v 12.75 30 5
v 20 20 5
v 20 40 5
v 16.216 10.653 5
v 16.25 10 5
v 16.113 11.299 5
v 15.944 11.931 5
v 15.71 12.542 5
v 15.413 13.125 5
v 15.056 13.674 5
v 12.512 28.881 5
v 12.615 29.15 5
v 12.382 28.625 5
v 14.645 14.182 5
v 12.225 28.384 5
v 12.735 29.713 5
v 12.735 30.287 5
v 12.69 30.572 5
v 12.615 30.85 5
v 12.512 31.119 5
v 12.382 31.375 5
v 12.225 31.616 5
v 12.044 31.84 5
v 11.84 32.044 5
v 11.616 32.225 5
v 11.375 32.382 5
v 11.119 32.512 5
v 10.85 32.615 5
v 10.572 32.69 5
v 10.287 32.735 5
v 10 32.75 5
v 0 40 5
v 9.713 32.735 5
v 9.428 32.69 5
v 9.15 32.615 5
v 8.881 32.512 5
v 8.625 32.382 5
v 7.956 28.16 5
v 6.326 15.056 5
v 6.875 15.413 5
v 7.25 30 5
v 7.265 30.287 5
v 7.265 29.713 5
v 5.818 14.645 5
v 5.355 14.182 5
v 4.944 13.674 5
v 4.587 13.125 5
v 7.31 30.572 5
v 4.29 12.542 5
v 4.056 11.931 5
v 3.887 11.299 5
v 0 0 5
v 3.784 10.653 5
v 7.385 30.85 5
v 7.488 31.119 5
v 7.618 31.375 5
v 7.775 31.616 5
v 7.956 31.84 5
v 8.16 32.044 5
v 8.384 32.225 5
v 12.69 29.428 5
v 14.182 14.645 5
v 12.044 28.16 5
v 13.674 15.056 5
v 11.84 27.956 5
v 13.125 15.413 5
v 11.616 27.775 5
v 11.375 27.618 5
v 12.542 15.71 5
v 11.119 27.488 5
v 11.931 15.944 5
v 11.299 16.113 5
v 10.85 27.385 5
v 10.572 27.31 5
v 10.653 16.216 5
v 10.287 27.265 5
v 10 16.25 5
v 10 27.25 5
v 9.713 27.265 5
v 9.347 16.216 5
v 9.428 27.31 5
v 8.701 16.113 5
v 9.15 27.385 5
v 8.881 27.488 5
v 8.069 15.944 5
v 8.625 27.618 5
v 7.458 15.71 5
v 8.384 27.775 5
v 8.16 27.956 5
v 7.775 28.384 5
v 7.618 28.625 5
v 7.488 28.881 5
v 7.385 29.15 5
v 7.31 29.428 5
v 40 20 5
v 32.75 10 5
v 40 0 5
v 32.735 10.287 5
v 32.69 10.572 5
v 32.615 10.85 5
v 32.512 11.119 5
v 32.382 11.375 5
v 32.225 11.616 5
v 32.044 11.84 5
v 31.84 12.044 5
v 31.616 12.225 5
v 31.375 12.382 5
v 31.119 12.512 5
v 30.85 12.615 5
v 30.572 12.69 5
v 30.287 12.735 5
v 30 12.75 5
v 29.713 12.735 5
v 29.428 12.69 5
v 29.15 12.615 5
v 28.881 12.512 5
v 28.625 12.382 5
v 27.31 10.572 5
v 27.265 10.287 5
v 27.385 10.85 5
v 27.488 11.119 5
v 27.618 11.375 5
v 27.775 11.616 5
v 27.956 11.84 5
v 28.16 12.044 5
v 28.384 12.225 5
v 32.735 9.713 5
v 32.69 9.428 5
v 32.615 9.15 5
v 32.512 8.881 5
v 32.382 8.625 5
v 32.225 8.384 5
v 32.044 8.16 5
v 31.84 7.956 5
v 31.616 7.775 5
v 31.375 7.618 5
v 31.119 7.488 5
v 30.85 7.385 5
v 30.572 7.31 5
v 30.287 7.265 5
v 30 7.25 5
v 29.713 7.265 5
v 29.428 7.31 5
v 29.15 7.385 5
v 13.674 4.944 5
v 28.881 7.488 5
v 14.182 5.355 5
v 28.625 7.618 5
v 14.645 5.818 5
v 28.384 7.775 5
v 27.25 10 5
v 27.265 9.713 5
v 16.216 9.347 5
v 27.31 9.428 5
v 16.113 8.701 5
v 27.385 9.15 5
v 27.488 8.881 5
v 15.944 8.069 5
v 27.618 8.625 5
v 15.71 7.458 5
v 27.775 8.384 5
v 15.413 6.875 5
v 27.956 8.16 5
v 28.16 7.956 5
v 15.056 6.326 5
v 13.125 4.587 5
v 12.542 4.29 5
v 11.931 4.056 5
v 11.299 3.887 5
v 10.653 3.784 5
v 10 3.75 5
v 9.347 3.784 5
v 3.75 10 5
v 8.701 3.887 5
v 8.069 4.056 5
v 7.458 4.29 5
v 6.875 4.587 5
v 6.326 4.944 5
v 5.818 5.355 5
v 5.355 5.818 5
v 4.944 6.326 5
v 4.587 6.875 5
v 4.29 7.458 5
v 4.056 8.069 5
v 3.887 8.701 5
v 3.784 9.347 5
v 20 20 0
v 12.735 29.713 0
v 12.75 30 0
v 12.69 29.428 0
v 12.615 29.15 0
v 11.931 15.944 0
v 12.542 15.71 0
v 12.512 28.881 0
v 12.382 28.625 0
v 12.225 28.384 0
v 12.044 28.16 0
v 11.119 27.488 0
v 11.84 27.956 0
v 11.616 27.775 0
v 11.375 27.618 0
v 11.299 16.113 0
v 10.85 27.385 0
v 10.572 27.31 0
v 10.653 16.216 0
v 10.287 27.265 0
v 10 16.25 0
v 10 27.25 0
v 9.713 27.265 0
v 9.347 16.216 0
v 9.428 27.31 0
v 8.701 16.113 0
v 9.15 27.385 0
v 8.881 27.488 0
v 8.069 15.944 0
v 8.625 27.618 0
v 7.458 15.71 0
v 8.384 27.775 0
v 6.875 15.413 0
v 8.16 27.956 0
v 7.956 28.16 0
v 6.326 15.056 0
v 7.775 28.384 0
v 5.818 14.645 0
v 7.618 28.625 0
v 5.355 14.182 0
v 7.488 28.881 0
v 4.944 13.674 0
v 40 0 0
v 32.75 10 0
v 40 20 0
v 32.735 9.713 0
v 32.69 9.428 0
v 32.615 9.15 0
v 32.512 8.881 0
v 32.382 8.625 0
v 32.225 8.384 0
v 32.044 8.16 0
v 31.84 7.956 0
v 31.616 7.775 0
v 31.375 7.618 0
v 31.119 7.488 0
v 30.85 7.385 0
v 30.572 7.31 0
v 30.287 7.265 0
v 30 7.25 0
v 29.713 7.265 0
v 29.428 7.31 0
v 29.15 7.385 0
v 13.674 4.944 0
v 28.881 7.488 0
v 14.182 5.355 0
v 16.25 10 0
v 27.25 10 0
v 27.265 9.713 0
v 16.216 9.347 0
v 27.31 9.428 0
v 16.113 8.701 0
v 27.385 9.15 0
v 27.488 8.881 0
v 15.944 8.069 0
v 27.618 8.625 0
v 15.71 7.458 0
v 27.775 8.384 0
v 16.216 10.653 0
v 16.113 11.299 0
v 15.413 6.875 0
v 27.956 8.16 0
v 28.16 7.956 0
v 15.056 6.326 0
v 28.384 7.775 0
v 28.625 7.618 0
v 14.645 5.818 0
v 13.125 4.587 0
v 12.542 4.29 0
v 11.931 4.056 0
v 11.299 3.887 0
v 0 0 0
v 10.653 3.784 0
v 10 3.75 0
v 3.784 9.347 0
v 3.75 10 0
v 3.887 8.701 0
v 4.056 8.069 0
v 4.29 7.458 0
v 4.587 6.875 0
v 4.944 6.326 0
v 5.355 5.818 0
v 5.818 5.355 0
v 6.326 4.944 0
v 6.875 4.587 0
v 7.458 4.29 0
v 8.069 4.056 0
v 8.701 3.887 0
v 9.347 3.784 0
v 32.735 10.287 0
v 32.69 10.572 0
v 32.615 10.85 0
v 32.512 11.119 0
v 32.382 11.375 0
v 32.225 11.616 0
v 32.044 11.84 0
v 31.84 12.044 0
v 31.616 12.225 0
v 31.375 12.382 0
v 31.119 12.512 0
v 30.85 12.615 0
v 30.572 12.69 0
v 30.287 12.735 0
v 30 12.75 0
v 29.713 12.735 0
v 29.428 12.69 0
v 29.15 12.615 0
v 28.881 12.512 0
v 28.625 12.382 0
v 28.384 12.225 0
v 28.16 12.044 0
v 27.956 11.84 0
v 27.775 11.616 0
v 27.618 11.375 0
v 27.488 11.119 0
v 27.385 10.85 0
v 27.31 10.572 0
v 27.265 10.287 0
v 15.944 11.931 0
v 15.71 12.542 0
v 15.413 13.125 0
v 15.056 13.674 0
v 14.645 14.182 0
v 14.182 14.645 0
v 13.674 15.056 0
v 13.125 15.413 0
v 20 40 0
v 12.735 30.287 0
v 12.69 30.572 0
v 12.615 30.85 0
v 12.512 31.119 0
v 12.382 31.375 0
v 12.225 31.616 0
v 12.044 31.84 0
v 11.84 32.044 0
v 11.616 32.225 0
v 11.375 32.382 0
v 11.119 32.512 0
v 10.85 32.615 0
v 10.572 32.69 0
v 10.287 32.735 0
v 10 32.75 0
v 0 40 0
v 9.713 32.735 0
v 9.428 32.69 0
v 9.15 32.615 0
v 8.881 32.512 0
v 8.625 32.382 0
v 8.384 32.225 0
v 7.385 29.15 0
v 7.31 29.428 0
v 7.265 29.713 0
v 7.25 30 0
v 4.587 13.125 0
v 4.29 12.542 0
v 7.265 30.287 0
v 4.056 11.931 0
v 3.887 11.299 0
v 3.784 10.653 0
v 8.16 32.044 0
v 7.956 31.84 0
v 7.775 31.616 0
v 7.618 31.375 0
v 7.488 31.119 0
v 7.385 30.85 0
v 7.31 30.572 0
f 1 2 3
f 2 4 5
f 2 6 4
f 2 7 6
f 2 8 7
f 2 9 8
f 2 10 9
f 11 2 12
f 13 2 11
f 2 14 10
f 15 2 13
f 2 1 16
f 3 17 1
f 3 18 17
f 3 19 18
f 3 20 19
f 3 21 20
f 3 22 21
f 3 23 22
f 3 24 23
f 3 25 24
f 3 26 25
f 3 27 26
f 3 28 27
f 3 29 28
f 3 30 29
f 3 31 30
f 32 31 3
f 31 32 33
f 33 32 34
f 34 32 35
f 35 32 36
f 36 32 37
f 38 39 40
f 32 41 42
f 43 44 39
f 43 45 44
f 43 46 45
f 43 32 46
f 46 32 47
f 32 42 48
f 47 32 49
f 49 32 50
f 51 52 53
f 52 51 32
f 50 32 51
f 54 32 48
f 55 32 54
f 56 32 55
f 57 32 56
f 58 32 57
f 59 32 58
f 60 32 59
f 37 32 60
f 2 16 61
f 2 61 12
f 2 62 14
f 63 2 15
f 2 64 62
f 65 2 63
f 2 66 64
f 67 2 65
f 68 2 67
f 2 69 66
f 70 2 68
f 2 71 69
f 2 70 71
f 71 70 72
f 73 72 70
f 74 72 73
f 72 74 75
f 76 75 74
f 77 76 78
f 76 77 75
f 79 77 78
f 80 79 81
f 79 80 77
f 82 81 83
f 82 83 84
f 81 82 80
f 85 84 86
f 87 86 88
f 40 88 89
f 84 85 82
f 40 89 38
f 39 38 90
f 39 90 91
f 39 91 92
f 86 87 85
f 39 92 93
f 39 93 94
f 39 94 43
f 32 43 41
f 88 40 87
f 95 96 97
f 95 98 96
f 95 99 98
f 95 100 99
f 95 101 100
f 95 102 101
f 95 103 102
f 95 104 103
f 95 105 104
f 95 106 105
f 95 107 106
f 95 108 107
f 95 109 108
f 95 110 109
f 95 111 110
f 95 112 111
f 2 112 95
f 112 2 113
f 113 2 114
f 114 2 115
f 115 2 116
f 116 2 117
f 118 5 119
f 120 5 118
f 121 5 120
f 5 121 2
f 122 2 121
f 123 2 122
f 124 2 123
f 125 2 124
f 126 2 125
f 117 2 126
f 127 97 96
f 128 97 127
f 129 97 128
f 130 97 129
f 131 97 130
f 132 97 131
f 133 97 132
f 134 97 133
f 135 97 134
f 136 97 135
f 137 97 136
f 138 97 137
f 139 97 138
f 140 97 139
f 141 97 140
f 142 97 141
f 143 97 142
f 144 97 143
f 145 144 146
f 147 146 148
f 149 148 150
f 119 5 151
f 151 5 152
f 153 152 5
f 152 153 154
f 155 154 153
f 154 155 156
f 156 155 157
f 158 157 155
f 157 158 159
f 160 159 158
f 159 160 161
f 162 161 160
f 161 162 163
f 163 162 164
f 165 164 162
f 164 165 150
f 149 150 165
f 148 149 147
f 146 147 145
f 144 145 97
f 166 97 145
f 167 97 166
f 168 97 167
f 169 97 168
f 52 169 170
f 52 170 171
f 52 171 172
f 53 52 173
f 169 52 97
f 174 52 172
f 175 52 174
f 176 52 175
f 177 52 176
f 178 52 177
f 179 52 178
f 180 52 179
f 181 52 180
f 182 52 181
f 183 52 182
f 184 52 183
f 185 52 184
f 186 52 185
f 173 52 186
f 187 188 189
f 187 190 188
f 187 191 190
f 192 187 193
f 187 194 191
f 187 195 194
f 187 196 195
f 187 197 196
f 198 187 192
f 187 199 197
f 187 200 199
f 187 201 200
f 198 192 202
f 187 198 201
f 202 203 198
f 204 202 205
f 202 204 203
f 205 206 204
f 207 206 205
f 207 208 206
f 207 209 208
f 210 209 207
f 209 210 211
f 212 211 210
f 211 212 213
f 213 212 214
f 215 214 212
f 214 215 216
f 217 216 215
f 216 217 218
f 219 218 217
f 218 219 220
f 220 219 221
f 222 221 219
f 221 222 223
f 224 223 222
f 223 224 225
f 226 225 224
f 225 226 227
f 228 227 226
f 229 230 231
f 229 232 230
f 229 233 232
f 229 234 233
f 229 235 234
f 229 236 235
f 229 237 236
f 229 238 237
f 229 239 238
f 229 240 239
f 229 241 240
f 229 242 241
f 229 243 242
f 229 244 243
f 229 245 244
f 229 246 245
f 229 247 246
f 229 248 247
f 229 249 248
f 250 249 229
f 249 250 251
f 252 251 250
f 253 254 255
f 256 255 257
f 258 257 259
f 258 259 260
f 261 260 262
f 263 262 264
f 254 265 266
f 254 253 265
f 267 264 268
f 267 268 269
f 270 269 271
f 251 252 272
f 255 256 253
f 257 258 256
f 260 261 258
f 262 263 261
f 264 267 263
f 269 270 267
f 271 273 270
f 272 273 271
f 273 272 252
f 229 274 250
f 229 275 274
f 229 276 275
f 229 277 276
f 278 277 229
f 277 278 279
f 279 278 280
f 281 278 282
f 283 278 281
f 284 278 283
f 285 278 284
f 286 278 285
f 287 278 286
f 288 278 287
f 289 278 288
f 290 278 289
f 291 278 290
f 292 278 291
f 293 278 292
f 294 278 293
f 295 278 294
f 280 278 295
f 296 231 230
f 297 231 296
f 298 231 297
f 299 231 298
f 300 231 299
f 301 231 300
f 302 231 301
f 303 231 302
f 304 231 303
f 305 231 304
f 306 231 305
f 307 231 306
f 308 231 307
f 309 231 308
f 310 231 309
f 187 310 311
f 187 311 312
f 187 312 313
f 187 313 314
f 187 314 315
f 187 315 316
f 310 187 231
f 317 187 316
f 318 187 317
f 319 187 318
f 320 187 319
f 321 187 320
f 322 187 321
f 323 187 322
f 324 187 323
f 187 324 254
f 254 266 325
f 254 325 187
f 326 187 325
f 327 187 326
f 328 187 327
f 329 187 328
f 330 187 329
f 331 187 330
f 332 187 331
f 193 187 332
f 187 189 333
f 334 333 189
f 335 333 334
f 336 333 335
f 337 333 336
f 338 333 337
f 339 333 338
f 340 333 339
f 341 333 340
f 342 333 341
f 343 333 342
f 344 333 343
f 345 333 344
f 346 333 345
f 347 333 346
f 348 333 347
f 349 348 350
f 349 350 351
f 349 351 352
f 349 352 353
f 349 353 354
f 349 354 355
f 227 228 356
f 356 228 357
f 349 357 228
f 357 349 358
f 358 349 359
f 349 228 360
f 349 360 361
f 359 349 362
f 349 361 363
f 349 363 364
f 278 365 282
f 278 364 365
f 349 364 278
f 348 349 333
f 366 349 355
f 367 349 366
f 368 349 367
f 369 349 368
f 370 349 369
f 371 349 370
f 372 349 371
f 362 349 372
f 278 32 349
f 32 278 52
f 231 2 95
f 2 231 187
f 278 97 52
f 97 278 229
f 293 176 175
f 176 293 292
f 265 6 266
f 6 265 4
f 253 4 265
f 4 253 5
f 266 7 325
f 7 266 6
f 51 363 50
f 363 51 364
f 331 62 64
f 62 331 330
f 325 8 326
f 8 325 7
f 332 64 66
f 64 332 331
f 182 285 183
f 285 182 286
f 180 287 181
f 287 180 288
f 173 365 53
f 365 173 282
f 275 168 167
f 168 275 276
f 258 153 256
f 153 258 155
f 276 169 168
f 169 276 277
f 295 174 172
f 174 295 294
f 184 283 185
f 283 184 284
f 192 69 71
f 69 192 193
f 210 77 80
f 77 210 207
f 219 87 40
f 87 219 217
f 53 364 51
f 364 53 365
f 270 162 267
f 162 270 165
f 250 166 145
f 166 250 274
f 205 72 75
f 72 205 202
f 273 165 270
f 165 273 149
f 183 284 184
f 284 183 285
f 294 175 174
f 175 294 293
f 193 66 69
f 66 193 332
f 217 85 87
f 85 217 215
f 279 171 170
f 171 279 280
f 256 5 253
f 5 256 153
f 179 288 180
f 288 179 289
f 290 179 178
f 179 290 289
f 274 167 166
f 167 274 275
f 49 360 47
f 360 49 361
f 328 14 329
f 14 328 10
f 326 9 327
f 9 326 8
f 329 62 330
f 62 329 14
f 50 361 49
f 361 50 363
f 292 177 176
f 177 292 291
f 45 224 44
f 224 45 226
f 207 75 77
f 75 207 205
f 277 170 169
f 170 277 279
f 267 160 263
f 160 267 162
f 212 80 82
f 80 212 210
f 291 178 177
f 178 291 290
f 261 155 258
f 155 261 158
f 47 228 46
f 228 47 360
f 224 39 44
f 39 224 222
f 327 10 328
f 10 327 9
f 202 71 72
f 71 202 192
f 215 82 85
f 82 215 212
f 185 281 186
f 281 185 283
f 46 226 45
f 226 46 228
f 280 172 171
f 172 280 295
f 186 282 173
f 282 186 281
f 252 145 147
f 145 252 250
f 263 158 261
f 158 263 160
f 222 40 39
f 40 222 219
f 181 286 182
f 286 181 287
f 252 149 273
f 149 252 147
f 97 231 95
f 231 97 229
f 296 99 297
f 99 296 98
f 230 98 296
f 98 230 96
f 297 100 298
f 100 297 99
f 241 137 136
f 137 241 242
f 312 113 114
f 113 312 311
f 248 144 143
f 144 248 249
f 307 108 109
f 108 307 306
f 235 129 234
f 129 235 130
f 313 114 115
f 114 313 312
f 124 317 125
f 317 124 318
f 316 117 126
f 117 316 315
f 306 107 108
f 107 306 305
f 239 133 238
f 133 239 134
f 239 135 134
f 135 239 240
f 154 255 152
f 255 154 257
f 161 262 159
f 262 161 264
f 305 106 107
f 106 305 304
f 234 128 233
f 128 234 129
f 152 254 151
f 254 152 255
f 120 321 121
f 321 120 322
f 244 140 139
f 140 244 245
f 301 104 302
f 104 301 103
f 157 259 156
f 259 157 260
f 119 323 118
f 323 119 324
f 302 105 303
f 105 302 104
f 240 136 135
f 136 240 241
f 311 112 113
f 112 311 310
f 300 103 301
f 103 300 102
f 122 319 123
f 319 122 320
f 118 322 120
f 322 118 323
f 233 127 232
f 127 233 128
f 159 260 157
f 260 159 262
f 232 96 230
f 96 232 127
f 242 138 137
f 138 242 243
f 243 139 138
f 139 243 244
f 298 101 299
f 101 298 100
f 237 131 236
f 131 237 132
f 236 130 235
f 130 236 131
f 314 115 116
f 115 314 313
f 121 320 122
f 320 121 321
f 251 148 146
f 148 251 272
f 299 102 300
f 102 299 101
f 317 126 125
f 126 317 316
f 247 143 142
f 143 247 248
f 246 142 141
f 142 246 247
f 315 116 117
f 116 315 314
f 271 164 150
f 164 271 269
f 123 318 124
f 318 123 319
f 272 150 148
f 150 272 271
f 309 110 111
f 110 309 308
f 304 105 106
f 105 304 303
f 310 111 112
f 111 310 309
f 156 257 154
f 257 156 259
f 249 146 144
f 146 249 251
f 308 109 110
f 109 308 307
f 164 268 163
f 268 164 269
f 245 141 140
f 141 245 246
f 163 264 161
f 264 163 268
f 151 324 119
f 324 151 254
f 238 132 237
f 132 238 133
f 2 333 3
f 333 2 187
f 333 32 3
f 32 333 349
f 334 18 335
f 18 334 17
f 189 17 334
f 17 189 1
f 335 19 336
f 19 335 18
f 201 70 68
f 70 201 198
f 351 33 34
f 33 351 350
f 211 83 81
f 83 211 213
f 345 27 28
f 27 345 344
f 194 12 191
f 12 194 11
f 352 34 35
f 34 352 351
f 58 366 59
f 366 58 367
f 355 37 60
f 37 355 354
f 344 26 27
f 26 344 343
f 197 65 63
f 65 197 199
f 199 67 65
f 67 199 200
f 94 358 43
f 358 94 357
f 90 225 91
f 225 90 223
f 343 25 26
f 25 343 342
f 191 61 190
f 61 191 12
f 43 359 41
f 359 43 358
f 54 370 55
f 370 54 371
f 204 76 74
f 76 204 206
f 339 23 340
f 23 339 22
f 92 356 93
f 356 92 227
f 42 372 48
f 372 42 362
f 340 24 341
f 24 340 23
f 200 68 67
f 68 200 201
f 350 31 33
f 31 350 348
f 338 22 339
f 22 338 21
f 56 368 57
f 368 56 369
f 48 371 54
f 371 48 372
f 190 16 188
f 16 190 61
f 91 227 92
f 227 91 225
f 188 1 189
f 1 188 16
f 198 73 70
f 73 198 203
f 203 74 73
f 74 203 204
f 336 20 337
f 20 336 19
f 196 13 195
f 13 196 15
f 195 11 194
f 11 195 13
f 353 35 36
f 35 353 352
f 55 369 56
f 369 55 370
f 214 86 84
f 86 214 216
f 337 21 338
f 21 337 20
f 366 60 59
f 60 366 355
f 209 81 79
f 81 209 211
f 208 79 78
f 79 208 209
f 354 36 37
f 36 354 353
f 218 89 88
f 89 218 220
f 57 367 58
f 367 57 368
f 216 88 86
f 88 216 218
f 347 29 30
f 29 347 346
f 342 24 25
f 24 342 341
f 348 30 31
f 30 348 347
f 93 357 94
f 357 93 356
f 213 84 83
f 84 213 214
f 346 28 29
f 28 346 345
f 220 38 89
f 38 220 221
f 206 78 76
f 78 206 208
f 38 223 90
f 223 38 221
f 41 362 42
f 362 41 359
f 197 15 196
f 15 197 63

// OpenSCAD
$fn = 60;

//switch size
switch = 12.5;

//screw size
screw = 5.5;

//extrusion size
extrusion = 20;

//plate thickness
thickness = 5;

//sides (2 = side by side, 3 = L shaped, 4 = square) 
side = 3;

difference()
{
    cube([extrusion,extrusion,thickness]);
    translate([extrusion/2, extrusion/2, 0]) cylinder(r = switch/2, h = thickness);    
}

translate([extrusion,0,0])
{
    difference()
    {
        cube([extrusion,extrusion,thickness]);
        translate([extrusion/2, extrusion/2, 0]) cylinder(r = screw/2, h = thickness); 
    }
}

if (side >= 3 )
    {
        translate([0,extrusion,0])
        {
            difference()
            {
            cube([extrusion,extrusion,thickness]);
            translate([extrusion/2, extrusion/2, 0]) cylinder(r = screw/2, h = thickness); 
            }
        }
    }
    
if (side == 4)
    {
        translate([extrusion,extrusion,0])
        {
            difference()
            {
               cube([extrusion,extrusion,thickness]);
               translate([extrusion/2, extrusion/2, 0]) cylinder(r = screw/2, h = thickness); 
            }
        }
    }
    
